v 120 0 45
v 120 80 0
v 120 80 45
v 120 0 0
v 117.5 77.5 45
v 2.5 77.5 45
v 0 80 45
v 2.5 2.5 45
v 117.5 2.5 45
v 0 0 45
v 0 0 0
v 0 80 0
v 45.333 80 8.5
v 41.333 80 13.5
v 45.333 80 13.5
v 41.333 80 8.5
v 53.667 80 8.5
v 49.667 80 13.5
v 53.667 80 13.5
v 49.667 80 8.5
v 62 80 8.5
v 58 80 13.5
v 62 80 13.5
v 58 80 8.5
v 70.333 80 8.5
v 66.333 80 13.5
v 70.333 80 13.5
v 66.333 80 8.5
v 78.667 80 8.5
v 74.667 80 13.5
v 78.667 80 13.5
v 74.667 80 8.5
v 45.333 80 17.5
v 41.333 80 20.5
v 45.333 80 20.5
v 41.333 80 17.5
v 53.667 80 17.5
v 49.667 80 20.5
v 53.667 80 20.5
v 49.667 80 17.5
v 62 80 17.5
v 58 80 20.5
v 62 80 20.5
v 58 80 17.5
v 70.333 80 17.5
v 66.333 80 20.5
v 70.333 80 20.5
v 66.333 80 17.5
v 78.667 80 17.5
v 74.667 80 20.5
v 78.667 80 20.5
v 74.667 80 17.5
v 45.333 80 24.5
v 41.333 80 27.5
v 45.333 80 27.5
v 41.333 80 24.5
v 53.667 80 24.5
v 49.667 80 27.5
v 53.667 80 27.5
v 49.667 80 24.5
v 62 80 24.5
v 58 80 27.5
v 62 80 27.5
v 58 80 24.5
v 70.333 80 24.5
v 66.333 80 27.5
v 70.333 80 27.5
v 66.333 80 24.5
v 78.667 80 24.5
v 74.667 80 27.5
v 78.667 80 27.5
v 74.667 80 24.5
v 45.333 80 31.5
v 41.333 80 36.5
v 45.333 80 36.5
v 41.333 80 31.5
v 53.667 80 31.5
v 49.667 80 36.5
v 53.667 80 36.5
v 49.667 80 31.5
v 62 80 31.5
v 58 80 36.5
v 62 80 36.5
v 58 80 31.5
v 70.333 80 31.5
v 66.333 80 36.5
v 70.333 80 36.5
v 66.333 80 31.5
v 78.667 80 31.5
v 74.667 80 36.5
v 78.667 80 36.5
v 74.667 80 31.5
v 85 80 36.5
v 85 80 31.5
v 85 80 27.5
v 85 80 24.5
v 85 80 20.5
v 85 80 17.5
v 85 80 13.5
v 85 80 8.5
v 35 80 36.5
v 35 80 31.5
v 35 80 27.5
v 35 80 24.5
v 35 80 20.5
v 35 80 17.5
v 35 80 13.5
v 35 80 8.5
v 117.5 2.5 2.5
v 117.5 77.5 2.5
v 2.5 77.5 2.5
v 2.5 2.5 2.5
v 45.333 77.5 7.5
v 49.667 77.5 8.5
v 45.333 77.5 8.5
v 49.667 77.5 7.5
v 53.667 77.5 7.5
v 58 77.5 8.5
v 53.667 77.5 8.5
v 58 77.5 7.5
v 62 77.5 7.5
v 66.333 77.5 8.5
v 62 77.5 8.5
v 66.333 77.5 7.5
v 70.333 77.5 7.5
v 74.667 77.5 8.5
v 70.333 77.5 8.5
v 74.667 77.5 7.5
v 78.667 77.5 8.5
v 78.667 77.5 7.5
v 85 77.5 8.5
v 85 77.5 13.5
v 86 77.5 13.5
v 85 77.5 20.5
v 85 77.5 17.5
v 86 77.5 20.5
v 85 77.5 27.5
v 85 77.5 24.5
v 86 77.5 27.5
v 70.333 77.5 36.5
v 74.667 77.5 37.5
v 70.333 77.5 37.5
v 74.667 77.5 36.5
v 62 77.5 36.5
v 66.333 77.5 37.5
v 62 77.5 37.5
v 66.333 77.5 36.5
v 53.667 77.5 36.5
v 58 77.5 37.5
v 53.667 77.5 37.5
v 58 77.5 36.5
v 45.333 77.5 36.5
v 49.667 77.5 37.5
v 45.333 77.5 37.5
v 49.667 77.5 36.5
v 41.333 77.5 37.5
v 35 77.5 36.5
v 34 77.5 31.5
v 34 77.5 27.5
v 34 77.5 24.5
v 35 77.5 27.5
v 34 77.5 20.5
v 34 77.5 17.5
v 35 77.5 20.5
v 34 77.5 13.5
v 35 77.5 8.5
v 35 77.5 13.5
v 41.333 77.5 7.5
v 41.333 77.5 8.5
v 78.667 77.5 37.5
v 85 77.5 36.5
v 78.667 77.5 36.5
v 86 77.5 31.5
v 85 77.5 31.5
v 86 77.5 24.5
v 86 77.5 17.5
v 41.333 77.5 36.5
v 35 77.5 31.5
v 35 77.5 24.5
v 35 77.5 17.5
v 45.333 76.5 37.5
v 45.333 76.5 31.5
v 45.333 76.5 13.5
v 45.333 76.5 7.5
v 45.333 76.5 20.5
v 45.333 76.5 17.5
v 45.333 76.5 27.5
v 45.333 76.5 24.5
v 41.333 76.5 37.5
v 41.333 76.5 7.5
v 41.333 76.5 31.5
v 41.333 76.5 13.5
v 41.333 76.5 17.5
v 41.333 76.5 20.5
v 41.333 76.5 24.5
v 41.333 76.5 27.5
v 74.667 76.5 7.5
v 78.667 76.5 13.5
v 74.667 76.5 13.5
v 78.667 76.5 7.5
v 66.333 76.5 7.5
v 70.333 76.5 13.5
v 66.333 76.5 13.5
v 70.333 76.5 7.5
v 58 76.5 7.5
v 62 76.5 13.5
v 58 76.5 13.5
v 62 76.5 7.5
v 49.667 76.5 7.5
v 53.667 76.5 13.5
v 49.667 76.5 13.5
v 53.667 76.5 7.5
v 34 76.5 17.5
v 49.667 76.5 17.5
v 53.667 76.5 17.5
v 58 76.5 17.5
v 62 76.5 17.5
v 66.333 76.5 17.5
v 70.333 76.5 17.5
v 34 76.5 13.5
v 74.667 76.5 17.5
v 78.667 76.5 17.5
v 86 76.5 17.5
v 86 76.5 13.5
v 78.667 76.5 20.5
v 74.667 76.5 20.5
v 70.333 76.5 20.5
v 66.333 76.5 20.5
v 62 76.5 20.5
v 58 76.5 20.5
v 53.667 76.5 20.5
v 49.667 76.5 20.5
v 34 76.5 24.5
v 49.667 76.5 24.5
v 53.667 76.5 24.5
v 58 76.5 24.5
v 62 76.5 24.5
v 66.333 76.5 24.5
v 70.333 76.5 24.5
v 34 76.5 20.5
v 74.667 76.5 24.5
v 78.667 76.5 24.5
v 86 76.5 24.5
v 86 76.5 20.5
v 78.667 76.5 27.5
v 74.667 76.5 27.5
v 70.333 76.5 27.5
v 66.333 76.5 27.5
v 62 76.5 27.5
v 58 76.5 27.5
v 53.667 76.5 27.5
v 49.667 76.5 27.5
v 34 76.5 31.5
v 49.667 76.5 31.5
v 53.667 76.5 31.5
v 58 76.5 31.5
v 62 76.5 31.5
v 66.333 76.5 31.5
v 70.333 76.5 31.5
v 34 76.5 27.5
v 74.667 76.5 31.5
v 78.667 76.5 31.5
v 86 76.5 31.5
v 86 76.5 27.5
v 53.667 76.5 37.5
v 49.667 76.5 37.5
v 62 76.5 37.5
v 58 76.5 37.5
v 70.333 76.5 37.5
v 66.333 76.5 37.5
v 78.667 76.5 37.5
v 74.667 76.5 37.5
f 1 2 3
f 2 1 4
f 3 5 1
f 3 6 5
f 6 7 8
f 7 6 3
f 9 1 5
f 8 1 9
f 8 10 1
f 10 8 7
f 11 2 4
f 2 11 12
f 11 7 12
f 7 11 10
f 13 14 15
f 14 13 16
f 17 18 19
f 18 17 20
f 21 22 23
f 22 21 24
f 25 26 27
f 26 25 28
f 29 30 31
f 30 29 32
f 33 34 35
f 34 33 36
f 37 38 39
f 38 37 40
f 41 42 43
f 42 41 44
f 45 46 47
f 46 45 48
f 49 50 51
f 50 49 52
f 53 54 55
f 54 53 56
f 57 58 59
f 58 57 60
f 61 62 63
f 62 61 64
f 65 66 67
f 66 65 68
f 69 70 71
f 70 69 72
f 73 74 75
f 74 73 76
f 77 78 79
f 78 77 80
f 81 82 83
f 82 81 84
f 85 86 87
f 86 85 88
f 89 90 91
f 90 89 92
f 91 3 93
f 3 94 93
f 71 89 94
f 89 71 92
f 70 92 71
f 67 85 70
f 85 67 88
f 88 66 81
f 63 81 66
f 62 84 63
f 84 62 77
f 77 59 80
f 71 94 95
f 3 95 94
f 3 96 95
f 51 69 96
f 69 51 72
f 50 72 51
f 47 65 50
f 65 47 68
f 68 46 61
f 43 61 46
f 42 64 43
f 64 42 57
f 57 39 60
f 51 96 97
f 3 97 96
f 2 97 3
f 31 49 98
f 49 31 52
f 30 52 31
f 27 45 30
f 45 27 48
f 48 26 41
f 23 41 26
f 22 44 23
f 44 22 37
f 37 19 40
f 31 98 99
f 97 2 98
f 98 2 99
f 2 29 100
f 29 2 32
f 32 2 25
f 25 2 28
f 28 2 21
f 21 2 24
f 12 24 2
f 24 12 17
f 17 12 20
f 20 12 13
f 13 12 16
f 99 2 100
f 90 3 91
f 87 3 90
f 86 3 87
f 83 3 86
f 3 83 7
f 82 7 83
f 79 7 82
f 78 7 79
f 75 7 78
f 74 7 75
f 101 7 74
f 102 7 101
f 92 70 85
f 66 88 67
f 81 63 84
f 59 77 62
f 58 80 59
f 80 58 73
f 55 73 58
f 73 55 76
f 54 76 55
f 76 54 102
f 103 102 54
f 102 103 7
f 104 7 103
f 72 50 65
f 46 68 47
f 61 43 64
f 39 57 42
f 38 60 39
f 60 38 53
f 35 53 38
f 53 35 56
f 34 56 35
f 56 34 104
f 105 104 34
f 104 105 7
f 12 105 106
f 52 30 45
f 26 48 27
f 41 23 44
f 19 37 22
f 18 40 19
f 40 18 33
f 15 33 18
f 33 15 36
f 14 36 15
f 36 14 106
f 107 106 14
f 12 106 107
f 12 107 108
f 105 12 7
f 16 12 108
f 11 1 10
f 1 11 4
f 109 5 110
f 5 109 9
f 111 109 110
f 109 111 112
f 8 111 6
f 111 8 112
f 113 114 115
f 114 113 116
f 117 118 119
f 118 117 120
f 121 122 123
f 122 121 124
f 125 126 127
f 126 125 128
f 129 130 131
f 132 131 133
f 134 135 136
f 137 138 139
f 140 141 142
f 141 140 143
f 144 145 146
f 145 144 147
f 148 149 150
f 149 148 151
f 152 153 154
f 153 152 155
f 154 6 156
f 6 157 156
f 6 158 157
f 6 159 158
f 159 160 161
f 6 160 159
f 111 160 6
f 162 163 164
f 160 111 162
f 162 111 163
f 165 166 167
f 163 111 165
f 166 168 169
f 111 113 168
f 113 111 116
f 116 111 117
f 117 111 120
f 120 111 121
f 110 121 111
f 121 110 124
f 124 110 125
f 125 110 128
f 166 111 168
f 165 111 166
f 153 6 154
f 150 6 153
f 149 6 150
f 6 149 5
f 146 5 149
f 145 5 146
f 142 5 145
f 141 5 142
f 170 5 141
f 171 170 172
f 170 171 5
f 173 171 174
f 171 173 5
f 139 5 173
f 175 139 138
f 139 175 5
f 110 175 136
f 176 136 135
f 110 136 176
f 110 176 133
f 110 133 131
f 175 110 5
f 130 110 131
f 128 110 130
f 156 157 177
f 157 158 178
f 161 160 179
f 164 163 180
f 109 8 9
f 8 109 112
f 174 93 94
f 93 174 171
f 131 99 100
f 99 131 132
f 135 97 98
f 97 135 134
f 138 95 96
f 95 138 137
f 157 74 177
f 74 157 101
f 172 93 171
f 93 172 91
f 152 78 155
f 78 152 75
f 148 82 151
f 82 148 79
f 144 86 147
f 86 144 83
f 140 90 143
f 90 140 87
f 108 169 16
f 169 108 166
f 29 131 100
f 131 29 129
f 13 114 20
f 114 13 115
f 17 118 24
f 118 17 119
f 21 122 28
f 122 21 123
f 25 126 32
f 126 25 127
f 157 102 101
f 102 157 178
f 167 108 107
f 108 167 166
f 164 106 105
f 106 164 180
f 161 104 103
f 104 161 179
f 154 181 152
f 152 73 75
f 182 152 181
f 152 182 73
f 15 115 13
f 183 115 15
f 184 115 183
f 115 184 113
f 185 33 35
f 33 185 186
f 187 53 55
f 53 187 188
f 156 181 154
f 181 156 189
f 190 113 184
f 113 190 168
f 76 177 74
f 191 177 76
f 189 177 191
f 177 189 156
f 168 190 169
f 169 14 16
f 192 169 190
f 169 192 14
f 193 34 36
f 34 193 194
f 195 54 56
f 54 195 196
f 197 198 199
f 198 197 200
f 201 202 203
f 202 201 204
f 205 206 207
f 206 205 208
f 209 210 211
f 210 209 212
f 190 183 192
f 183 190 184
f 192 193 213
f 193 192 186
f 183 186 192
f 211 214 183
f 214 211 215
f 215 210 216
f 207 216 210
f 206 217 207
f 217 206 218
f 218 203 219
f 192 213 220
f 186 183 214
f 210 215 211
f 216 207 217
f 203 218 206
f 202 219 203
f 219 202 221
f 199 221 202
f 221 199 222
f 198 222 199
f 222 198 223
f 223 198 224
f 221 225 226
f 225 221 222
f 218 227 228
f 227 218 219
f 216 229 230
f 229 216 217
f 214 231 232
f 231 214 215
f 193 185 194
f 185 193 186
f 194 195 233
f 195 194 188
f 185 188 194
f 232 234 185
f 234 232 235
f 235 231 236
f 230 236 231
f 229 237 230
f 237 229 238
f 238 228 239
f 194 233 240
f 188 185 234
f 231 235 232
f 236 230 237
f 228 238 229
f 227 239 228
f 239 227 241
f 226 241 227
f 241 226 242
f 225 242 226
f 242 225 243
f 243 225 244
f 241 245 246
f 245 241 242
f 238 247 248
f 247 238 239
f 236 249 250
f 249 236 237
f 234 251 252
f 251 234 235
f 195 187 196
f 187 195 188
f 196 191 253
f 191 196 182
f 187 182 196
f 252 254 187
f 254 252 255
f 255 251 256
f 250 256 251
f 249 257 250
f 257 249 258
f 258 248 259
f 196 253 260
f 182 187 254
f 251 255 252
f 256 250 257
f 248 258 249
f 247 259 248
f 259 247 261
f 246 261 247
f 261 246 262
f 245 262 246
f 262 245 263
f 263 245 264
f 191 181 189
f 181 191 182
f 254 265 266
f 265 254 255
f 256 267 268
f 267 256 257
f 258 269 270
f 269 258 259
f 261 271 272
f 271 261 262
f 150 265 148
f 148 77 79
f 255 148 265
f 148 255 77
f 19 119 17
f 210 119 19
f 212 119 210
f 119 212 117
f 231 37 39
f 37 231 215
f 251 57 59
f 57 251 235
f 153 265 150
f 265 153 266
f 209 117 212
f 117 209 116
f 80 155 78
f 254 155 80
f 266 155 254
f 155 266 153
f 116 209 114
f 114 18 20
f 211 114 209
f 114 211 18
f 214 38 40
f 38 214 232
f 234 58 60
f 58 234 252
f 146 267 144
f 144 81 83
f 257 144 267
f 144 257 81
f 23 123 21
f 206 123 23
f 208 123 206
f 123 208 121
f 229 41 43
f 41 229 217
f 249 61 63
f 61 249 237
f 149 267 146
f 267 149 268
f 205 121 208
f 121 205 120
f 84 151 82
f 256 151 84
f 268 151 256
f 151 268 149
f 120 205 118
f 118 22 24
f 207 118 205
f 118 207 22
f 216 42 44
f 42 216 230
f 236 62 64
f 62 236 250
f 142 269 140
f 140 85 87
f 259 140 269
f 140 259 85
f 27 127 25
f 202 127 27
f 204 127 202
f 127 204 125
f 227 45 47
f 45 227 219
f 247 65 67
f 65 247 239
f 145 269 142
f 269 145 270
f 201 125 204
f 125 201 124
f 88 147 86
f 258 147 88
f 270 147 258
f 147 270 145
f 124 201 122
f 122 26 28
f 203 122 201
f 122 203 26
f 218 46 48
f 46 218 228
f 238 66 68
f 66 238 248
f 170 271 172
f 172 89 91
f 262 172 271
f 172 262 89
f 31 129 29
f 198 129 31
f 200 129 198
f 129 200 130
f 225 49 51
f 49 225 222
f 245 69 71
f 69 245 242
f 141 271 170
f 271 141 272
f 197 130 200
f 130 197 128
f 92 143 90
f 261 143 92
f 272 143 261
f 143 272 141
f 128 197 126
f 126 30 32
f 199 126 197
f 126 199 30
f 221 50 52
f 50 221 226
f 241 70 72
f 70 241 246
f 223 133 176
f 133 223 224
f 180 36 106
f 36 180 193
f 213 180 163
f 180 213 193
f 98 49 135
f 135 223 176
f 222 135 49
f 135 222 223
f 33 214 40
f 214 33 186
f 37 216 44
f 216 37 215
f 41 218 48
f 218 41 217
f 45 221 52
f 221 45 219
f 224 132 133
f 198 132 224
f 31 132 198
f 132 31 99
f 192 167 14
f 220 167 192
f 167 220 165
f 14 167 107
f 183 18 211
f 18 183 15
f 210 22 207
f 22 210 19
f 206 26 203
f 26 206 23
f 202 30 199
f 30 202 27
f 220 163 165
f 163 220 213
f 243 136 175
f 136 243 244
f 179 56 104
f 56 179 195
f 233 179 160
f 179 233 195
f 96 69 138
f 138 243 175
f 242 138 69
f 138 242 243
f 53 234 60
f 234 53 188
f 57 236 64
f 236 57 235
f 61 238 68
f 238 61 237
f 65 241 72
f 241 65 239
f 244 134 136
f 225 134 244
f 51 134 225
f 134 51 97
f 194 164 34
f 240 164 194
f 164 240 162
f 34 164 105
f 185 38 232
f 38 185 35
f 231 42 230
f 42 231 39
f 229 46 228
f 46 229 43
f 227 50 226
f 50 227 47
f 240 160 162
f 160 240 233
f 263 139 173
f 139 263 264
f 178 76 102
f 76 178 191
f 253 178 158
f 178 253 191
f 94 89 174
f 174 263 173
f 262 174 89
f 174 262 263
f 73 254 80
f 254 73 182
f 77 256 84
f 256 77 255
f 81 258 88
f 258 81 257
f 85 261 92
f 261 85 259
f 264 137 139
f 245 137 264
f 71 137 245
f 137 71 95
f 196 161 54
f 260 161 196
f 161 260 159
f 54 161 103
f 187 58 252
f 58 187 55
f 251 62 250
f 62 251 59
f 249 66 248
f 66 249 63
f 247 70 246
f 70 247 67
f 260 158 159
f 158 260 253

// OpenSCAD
$fn = 32;

// ----------------------------------------------------------------------
// Vent box: crossgrid enclosure
// ----------------------------------------------------------------------

// --- parameters (mm) ---
box_l = 120;              // box length, X
box_w = 80;               // box width, Y
box_h = 45;               // box height, Z
wall_t = 2.5;             // shell wall thickness
win_l = 50;               // vent window width, X
win_h = 28;               // vent window height, Z
bar_w = 4;                // grid bar width
n_v = 5;                  // vertical bar count
n_h = 3;                  // horizontal bar count

win_z0 = (box_h - win_h) / 2;  // window lower edge Z
v_step = win_l / (n_v + 1);  // vertical bar step
h_step = win_h / (n_h + 1);  // horizontal bar step

difference() {
  union() {
    difference() {
      cube([box_l, box_w, box_h]);
  translate([wall_t, wall_t, wall_t])
    cube([box_l - 2 * wall_t, box_w - 2 * wall_t, box_h]);
  translate([(box_l - win_l) / 2, box_w - wall_t - 1, win_z0])
    cube([win_l, wall_t + 2, win_h]);
    }
    for (i = [1 : n_v])
      translate([(box_l - win_l) / 2 + i * v_step - bar_w / 2,
                 box_w - wall_t - 1, win_z0 - 1])
        cube([bar_w, wall_t + 1, win_h + 2]);
    for (i = [1 : n_h])
      translate([(box_l - win_l) / 2 - 1, box_w - wall_t - 1,
                 win_z0 + i * h_step - bar_w / 2])
        cube([win_l + 2, wall_t + 1, bar_w]);
  }
}
